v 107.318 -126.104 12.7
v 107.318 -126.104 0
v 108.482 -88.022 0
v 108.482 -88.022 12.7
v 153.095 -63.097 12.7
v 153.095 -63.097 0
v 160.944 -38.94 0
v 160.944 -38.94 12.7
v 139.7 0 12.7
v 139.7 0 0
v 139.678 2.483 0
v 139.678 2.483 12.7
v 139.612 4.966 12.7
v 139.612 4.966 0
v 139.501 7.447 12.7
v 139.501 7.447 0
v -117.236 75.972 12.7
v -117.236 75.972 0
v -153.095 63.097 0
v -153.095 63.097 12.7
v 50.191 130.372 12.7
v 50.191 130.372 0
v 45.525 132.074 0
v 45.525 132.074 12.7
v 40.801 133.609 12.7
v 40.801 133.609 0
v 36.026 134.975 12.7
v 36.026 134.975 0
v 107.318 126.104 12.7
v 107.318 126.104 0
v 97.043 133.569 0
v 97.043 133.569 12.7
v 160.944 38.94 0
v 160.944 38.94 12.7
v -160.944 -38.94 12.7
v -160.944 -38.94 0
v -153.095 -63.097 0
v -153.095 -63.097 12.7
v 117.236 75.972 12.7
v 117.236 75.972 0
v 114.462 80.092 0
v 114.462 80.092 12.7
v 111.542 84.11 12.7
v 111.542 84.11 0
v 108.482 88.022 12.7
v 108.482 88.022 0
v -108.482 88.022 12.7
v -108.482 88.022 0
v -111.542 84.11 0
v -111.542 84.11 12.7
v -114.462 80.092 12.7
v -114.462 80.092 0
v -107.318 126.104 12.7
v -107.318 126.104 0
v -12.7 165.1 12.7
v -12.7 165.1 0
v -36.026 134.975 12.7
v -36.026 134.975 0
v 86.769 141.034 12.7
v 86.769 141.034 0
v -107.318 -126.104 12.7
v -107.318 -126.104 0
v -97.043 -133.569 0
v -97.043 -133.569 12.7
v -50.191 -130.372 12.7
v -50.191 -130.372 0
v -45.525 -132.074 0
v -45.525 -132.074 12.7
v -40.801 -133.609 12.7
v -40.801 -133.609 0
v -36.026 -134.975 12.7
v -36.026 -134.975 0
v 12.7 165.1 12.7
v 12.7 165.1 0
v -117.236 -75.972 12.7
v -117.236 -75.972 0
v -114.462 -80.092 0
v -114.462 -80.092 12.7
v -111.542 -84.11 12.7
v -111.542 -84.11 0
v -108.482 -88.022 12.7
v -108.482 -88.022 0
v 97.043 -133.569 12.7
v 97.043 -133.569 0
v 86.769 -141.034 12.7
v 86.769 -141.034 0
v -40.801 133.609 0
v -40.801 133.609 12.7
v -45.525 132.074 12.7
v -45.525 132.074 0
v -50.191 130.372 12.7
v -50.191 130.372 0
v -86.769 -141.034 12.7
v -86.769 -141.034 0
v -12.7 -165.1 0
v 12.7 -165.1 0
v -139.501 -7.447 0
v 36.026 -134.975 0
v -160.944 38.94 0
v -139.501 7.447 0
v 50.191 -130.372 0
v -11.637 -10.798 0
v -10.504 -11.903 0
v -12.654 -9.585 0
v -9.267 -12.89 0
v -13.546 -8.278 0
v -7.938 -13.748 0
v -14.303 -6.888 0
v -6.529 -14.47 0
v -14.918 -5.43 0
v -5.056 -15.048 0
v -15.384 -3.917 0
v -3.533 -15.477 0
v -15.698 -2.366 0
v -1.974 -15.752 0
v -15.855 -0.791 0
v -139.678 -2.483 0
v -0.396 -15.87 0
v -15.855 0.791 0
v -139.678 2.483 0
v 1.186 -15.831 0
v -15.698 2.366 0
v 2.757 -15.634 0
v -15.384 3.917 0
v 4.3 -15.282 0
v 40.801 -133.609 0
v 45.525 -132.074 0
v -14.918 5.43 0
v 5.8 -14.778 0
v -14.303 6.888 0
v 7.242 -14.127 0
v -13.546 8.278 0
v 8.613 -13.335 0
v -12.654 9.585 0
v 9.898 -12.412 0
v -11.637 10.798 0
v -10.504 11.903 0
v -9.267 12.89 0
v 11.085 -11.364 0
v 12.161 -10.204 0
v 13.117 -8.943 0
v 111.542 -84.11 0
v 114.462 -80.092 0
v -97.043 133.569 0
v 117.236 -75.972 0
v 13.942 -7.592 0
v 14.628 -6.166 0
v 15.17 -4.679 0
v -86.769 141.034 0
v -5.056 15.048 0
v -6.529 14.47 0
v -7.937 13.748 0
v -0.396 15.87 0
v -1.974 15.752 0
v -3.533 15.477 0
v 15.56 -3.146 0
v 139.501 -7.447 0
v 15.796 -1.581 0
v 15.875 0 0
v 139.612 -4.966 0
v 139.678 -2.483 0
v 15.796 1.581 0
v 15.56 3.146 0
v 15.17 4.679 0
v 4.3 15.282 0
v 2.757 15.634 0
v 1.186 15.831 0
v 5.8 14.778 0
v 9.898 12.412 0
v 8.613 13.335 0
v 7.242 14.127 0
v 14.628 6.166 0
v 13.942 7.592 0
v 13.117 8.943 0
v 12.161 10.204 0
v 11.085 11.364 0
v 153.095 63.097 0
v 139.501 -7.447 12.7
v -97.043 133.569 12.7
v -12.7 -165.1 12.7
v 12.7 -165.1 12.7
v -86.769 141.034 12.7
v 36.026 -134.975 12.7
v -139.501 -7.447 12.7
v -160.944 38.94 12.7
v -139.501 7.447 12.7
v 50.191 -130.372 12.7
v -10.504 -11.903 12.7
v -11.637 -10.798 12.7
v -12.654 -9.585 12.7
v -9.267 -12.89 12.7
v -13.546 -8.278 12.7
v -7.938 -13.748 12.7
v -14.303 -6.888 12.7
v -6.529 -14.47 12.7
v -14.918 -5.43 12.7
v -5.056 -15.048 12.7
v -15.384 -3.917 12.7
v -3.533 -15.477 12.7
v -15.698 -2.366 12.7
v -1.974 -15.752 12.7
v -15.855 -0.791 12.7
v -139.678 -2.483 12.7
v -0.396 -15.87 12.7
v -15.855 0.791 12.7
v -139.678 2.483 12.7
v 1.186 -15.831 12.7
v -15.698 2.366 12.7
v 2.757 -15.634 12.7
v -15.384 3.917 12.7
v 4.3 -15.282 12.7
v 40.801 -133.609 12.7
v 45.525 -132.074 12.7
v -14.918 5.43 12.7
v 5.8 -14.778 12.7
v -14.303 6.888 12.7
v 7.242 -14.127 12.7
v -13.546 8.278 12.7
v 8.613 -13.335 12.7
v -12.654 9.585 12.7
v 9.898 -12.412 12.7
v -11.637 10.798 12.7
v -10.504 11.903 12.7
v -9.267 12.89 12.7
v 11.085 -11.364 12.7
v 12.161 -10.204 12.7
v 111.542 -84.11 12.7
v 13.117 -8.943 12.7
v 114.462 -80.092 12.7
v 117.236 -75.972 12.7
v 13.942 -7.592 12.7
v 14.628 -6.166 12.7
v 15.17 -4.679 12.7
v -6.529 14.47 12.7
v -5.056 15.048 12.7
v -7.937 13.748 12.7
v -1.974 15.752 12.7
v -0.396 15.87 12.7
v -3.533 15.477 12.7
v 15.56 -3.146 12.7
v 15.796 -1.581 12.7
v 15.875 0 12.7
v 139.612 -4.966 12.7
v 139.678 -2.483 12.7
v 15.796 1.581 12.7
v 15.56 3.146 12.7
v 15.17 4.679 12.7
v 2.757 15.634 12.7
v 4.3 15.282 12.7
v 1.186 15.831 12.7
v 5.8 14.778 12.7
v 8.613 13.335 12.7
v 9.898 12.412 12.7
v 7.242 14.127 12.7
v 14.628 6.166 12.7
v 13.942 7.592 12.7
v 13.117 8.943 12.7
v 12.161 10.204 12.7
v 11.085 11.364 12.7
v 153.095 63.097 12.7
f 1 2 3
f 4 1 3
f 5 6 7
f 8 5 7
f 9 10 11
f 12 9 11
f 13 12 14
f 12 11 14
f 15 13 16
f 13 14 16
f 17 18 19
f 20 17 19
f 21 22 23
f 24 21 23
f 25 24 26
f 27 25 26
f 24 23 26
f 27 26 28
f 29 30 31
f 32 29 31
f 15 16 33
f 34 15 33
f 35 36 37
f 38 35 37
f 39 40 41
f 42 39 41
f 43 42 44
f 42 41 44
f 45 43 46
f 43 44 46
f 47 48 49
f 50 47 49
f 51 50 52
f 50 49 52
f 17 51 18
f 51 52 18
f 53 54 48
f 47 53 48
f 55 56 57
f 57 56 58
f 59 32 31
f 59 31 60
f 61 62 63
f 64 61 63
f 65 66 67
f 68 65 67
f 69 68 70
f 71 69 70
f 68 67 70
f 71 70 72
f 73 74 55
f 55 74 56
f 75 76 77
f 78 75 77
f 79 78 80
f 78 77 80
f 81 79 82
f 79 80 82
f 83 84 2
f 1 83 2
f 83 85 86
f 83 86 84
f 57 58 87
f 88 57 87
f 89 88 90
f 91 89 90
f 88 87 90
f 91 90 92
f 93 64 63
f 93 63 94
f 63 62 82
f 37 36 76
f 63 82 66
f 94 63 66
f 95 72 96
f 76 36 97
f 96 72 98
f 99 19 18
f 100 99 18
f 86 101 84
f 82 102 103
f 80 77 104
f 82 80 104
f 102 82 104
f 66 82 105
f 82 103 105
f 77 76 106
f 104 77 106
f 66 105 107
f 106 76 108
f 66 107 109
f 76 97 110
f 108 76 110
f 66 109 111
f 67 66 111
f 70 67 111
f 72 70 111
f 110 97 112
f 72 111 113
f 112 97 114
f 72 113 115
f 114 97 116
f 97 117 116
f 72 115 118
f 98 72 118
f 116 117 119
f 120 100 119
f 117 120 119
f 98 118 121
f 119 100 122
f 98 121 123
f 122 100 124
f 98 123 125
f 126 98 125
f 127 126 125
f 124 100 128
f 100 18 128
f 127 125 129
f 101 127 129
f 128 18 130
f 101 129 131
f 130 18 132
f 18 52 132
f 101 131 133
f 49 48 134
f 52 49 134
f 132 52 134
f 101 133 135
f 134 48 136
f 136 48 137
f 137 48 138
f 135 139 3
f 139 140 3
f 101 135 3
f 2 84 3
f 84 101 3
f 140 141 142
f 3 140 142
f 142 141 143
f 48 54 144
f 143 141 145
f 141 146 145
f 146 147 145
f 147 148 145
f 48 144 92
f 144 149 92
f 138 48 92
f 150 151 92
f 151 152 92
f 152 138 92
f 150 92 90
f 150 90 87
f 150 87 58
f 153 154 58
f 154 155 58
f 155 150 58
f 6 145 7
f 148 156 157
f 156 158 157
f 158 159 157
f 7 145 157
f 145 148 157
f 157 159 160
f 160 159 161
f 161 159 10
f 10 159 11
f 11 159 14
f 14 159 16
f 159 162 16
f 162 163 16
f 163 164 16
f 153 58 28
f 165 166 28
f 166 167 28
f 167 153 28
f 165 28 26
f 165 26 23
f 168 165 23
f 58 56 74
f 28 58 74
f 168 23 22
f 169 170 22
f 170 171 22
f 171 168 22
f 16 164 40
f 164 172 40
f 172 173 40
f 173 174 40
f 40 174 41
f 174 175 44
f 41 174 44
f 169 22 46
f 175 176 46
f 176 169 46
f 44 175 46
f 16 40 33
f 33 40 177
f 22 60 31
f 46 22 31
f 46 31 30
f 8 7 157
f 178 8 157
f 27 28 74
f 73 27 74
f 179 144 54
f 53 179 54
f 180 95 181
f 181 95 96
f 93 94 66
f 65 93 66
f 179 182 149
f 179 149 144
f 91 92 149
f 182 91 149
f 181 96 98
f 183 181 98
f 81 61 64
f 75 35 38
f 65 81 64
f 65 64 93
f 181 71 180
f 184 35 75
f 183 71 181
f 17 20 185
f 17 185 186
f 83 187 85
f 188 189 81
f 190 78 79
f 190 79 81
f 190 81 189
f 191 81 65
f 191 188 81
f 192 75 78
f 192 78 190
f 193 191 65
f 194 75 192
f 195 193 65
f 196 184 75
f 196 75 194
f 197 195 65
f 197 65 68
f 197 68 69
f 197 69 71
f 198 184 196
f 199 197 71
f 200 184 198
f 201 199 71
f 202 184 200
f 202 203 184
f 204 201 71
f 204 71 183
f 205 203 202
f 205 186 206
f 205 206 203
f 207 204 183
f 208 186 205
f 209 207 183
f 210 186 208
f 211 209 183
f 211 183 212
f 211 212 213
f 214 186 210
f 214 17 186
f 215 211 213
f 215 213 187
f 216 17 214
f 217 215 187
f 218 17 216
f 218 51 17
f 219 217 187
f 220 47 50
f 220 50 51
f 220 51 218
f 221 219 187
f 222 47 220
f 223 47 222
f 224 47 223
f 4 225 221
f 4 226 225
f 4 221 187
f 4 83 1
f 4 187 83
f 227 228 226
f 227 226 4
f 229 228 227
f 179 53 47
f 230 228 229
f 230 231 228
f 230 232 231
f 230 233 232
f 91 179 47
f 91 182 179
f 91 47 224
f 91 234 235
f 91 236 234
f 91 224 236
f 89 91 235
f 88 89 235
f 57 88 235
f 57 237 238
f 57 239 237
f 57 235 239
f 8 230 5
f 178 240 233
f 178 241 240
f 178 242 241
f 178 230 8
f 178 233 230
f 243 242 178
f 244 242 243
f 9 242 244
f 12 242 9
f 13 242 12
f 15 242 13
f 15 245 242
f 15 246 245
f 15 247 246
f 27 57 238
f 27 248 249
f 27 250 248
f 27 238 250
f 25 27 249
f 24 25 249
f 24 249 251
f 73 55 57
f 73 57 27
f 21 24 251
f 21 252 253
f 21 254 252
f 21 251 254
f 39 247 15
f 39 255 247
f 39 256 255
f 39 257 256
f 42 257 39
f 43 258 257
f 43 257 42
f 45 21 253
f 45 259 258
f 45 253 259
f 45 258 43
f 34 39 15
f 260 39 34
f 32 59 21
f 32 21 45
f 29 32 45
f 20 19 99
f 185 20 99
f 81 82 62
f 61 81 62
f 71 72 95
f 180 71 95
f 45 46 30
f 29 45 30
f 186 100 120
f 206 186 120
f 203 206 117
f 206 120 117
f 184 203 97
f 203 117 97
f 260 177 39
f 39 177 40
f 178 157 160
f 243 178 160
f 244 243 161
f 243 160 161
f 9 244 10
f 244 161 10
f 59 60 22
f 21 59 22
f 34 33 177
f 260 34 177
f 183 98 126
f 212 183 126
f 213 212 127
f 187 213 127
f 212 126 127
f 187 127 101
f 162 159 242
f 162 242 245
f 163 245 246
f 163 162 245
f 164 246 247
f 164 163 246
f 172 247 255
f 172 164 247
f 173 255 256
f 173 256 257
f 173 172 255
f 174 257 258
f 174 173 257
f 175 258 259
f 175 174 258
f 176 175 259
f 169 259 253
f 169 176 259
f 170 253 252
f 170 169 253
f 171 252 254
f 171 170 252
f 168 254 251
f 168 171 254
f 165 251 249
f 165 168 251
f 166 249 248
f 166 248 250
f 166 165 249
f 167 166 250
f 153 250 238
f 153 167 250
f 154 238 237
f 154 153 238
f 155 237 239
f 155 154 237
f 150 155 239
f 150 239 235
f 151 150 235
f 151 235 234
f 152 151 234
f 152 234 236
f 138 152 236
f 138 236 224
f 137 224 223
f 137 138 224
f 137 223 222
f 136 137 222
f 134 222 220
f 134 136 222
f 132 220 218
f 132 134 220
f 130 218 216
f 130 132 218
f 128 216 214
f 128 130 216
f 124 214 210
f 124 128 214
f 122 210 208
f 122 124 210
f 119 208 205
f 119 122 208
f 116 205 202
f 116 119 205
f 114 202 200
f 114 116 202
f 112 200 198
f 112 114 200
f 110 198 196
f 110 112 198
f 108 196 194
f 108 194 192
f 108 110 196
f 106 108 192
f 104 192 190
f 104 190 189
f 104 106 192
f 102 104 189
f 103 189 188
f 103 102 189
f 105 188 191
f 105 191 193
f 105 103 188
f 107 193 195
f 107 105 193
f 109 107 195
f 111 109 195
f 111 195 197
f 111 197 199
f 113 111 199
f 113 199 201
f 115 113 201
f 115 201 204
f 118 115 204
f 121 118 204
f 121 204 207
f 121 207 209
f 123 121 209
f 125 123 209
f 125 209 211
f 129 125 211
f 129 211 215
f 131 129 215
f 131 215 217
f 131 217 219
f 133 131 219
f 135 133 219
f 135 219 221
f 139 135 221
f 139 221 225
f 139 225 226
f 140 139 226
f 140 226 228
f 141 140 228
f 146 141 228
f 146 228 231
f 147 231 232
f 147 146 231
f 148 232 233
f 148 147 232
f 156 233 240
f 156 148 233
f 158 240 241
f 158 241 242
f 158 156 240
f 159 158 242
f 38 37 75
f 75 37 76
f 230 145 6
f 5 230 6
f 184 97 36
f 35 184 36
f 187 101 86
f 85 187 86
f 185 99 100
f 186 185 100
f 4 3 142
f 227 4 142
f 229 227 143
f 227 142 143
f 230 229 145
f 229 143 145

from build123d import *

# Parameters (mm, degrees)
F0_R     = 15.875
F1_DEPTH = 12.7


with BuildPart() as f1:
    # F0 (on Top) → F1 (new body)
    with BuildSketch(Plane.XY):
        with BuildLine():
            ThreePointArc((139.501369, -7.447021), (139.650333, -3.724835), (139.7, 0))
            ThreePointArc((139.7, 0), (139.650333, 3.724835), (139.501369, 7.447021))
            ThreePointArc((139.501369, 7.447021), (132.862595, 43.169674), (117.236227, 75.97208))
            ThreePointArc((117.236227, 75.97208), (113.019674, 82.1136), (108.481729, 88.021614))
            ThreePointArc((108.481729, 88.021614), (82.1136, 113.019674), (50.190832, 130.37243))
            ThreePointArc((50.190832, 130.37243), (43.169674, 132.862595), (36.025756, 134.974942))
            ThreePointArc((36.025756, 134.974942), (0, 139.7), (-36.025756, 134.974942))
            ThreePointArc((-36.025756, 134.974942), (-43.169674, 132.862595), (-50.190832, 130.37243))
            ThreePointArc((-50.190832, 130.37243), (-82.1136, 113.019674), (-108.481729, 88.021614))
            ThreePointArc((-108.481729, 88.021614), (-113.019674, 82.1136), (-117.236227, 75.97208))
            ThreePointArc((-117.236227, 75.97208), (-132.862595, 43.169674), (-139.501369, 7.447021))
            ThreePointArc((-139.501369, 7.447021), (-139.7, 0), (-139.501369, -7.447021))
            ThreePointArc((-139.501369, -7.447021), (-132.862595, -43.169674), (-117.236227, -75.97208))
            ThreePointArc((-117.236227, -75.97208), (-113.019674, -82.1136), (-108.481729, -88.021614))
            ThreePointArc((-108.481729, -88.021614), (-82.1136, -113.019674), (-50.190832, -130.37243))
            ThreePointArc((-50.190832, -130.37243), (-43.169674, -132.862595), (-36.025756, -134.974942))
            ThreePointArc((-36.025756, -134.974942), (0, -139.7), (36.025756, -134.974942))
            ThreePointArc((36.025756, -134.974942), (43.169674, -132.862595), (50.190832, -130.37243))
            ThreePointArc((50.190832, -130.37243), (82.1136, -113.019674), (108.481729, -88.021614))
            ThreePointArc((108.481729, -88.021614), (113.019674, -82.1136), (117.236227, -75.97208))
            ThreePointArc((117.236227, -75.97208), (132.862595, -43.169674), (139.501369, -7.447021))
        make_face()
        Circle(F0_R, mode=Mode.SUBTRACT)
        with BuildLine():
            ThreePointArc((117.236227, 75.97208), (132.862595, 43.169674), (139.501369, 7.447021))
            Line((139.501369, 7.447021), (160.943947, 38.940288))
            Line((160.943947, 38.940288), (157.019431, 51.018706))
            Line((157.019431, 51.018706), (153.094915, 63.097124))
            Line((153.094915, 63.097124), (117.236227, 75.97208))
        make_face()
        with BuildLine():
            Line((160.943947, -38.940288), (139.501369, -7.447021))
            ThreePointArc((139.501369, -7.447021), (132.862595, -43.169674), (117.236227, -75.97208))
            Line((117.236227, -75.97208), (153.094915, -63.097124))
            Line((153.094915, -63.097124), (157.019431, -51.018706))
            Line((157.019431, -51.018706), (160.943947, -38.940288))
        make_face()
        with BuildLine():
            ThreePointArc((50.190832, 130.37243), (82.1136, 113.019674), (108.481729, 88.021614))
            Line((108.481729, 88.021614), (107.317861, 126.103833))
            Line((107.317861, 126.103833), (97.043345, 133.568706))
            Line((97.043345, 133.568706), (86.768829, 141.033578))
            Line((86.768829, 141.033578), (50.190832, 130.37243))
        make_face()
        with BuildLine():
            Line((107.317861, -126.103833), (108.481729, -88.021614))
            ThreePointArc((108.481729, -88.021614), (82.1136, -113.019674), (50.190832, -130.37243))
            Line((50.190832, -130.37243), (86.768829, -141.033578))
            Line((86.768829, -141.033578), (97.043345, -133.568706))
            Line((97.043345, -133.568706), (107.317861, -126.103833))
        make_face()
        with BuildLine():
            ThreePointArc((-36.025756, 134.974942), (0, 139.7), (36.025756, 134.974942))
            Line((36.025756, 134.974942), (12.7, 165.1))
            Line((12.7, 165.1), (0, 165.1))
            Line((0, 165.1), (-12.7, 165.1))
            Line((-12.7, 165.1), (-36.025756, 134.974942))
        make_face()
        with BuildLine():
            Line((12.7, -165.1), (36.025756, -134.974942))
            ThreePointArc((36.025756, -134.974942), (0, -139.7), (-36.025756, -134.974942))
            Line((-36.025756, -134.974942), (-12.7, -165.1))
            Line((-12.7, -165.1), (0, -165.1))
            Line((0, -165.1), (12.7, -165.1))
        make_face()
        with BuildLine():
            ThreePointArc((-108.481729, 88.021614), (-82.1136, 113.019674), (-50.190832, 130.37243))
            Line((-50.190832, 130.37243), (-86.768829, 141.033578))
            Line((-86.768829, 141.033578), (-97.043345, 133.568706))
            Line((-97.043345, 133.568706), (-107.317861, 126.103833))
            Line((-107.317861, 126.103833), (-108.481729, 88.021614))
        make_face()
        with BuildLine():
            Line((-86.768829, -141.033578), (-50.190832, -130.37243))
            ThreePointArc((-50.190832, -130.37243), (-82.1136, -113.019674), (-108.481729, -88.021614))
            Line((-108.481729, -88.021614), (-107.317861, -126.103833))
            Line((-107.317861, -126.103833), (-97.043345, -133.568706))
            Line((-97.043345, -133.568706), (-86.768829, -141.033578))
        make_face()
        with BuildLine():
            ThreePointArc((-139.501369, 7.447021), (-132.862595, 43.169674), (-117.236227, 75.97208))
            Line((-117.236227, 75.97208), (-153.094915, 63.097124))
            Line((-153.094915, 63.097124), (-157.019431, 51.018706))
            Line((-157.019431, 51.018706), (-160.943947, 38.940288))
            Line((-160.943947, 38.940288), (-139.501369, 7.447021))
        make_face()
        with BuildLine():
            Line((-153.094915, -63.097124), (-117.236227, -75.97208))
            ThreePointArc((-117.236227, -75.97208), (-132.862595, -43.169674), (-139.501369, -7.447021))
            Line((-139.501369, -7.447021), (-160.943947, -38.940288))
            Line((-160.943947, -38.940288), (-157.019431, -51.018706))
            Line((-157.019431, -51.018706), (-153.094915, -63.097124))
        make_face()
    extrude(amount=F1_DEPTH)


solid = f1.part
